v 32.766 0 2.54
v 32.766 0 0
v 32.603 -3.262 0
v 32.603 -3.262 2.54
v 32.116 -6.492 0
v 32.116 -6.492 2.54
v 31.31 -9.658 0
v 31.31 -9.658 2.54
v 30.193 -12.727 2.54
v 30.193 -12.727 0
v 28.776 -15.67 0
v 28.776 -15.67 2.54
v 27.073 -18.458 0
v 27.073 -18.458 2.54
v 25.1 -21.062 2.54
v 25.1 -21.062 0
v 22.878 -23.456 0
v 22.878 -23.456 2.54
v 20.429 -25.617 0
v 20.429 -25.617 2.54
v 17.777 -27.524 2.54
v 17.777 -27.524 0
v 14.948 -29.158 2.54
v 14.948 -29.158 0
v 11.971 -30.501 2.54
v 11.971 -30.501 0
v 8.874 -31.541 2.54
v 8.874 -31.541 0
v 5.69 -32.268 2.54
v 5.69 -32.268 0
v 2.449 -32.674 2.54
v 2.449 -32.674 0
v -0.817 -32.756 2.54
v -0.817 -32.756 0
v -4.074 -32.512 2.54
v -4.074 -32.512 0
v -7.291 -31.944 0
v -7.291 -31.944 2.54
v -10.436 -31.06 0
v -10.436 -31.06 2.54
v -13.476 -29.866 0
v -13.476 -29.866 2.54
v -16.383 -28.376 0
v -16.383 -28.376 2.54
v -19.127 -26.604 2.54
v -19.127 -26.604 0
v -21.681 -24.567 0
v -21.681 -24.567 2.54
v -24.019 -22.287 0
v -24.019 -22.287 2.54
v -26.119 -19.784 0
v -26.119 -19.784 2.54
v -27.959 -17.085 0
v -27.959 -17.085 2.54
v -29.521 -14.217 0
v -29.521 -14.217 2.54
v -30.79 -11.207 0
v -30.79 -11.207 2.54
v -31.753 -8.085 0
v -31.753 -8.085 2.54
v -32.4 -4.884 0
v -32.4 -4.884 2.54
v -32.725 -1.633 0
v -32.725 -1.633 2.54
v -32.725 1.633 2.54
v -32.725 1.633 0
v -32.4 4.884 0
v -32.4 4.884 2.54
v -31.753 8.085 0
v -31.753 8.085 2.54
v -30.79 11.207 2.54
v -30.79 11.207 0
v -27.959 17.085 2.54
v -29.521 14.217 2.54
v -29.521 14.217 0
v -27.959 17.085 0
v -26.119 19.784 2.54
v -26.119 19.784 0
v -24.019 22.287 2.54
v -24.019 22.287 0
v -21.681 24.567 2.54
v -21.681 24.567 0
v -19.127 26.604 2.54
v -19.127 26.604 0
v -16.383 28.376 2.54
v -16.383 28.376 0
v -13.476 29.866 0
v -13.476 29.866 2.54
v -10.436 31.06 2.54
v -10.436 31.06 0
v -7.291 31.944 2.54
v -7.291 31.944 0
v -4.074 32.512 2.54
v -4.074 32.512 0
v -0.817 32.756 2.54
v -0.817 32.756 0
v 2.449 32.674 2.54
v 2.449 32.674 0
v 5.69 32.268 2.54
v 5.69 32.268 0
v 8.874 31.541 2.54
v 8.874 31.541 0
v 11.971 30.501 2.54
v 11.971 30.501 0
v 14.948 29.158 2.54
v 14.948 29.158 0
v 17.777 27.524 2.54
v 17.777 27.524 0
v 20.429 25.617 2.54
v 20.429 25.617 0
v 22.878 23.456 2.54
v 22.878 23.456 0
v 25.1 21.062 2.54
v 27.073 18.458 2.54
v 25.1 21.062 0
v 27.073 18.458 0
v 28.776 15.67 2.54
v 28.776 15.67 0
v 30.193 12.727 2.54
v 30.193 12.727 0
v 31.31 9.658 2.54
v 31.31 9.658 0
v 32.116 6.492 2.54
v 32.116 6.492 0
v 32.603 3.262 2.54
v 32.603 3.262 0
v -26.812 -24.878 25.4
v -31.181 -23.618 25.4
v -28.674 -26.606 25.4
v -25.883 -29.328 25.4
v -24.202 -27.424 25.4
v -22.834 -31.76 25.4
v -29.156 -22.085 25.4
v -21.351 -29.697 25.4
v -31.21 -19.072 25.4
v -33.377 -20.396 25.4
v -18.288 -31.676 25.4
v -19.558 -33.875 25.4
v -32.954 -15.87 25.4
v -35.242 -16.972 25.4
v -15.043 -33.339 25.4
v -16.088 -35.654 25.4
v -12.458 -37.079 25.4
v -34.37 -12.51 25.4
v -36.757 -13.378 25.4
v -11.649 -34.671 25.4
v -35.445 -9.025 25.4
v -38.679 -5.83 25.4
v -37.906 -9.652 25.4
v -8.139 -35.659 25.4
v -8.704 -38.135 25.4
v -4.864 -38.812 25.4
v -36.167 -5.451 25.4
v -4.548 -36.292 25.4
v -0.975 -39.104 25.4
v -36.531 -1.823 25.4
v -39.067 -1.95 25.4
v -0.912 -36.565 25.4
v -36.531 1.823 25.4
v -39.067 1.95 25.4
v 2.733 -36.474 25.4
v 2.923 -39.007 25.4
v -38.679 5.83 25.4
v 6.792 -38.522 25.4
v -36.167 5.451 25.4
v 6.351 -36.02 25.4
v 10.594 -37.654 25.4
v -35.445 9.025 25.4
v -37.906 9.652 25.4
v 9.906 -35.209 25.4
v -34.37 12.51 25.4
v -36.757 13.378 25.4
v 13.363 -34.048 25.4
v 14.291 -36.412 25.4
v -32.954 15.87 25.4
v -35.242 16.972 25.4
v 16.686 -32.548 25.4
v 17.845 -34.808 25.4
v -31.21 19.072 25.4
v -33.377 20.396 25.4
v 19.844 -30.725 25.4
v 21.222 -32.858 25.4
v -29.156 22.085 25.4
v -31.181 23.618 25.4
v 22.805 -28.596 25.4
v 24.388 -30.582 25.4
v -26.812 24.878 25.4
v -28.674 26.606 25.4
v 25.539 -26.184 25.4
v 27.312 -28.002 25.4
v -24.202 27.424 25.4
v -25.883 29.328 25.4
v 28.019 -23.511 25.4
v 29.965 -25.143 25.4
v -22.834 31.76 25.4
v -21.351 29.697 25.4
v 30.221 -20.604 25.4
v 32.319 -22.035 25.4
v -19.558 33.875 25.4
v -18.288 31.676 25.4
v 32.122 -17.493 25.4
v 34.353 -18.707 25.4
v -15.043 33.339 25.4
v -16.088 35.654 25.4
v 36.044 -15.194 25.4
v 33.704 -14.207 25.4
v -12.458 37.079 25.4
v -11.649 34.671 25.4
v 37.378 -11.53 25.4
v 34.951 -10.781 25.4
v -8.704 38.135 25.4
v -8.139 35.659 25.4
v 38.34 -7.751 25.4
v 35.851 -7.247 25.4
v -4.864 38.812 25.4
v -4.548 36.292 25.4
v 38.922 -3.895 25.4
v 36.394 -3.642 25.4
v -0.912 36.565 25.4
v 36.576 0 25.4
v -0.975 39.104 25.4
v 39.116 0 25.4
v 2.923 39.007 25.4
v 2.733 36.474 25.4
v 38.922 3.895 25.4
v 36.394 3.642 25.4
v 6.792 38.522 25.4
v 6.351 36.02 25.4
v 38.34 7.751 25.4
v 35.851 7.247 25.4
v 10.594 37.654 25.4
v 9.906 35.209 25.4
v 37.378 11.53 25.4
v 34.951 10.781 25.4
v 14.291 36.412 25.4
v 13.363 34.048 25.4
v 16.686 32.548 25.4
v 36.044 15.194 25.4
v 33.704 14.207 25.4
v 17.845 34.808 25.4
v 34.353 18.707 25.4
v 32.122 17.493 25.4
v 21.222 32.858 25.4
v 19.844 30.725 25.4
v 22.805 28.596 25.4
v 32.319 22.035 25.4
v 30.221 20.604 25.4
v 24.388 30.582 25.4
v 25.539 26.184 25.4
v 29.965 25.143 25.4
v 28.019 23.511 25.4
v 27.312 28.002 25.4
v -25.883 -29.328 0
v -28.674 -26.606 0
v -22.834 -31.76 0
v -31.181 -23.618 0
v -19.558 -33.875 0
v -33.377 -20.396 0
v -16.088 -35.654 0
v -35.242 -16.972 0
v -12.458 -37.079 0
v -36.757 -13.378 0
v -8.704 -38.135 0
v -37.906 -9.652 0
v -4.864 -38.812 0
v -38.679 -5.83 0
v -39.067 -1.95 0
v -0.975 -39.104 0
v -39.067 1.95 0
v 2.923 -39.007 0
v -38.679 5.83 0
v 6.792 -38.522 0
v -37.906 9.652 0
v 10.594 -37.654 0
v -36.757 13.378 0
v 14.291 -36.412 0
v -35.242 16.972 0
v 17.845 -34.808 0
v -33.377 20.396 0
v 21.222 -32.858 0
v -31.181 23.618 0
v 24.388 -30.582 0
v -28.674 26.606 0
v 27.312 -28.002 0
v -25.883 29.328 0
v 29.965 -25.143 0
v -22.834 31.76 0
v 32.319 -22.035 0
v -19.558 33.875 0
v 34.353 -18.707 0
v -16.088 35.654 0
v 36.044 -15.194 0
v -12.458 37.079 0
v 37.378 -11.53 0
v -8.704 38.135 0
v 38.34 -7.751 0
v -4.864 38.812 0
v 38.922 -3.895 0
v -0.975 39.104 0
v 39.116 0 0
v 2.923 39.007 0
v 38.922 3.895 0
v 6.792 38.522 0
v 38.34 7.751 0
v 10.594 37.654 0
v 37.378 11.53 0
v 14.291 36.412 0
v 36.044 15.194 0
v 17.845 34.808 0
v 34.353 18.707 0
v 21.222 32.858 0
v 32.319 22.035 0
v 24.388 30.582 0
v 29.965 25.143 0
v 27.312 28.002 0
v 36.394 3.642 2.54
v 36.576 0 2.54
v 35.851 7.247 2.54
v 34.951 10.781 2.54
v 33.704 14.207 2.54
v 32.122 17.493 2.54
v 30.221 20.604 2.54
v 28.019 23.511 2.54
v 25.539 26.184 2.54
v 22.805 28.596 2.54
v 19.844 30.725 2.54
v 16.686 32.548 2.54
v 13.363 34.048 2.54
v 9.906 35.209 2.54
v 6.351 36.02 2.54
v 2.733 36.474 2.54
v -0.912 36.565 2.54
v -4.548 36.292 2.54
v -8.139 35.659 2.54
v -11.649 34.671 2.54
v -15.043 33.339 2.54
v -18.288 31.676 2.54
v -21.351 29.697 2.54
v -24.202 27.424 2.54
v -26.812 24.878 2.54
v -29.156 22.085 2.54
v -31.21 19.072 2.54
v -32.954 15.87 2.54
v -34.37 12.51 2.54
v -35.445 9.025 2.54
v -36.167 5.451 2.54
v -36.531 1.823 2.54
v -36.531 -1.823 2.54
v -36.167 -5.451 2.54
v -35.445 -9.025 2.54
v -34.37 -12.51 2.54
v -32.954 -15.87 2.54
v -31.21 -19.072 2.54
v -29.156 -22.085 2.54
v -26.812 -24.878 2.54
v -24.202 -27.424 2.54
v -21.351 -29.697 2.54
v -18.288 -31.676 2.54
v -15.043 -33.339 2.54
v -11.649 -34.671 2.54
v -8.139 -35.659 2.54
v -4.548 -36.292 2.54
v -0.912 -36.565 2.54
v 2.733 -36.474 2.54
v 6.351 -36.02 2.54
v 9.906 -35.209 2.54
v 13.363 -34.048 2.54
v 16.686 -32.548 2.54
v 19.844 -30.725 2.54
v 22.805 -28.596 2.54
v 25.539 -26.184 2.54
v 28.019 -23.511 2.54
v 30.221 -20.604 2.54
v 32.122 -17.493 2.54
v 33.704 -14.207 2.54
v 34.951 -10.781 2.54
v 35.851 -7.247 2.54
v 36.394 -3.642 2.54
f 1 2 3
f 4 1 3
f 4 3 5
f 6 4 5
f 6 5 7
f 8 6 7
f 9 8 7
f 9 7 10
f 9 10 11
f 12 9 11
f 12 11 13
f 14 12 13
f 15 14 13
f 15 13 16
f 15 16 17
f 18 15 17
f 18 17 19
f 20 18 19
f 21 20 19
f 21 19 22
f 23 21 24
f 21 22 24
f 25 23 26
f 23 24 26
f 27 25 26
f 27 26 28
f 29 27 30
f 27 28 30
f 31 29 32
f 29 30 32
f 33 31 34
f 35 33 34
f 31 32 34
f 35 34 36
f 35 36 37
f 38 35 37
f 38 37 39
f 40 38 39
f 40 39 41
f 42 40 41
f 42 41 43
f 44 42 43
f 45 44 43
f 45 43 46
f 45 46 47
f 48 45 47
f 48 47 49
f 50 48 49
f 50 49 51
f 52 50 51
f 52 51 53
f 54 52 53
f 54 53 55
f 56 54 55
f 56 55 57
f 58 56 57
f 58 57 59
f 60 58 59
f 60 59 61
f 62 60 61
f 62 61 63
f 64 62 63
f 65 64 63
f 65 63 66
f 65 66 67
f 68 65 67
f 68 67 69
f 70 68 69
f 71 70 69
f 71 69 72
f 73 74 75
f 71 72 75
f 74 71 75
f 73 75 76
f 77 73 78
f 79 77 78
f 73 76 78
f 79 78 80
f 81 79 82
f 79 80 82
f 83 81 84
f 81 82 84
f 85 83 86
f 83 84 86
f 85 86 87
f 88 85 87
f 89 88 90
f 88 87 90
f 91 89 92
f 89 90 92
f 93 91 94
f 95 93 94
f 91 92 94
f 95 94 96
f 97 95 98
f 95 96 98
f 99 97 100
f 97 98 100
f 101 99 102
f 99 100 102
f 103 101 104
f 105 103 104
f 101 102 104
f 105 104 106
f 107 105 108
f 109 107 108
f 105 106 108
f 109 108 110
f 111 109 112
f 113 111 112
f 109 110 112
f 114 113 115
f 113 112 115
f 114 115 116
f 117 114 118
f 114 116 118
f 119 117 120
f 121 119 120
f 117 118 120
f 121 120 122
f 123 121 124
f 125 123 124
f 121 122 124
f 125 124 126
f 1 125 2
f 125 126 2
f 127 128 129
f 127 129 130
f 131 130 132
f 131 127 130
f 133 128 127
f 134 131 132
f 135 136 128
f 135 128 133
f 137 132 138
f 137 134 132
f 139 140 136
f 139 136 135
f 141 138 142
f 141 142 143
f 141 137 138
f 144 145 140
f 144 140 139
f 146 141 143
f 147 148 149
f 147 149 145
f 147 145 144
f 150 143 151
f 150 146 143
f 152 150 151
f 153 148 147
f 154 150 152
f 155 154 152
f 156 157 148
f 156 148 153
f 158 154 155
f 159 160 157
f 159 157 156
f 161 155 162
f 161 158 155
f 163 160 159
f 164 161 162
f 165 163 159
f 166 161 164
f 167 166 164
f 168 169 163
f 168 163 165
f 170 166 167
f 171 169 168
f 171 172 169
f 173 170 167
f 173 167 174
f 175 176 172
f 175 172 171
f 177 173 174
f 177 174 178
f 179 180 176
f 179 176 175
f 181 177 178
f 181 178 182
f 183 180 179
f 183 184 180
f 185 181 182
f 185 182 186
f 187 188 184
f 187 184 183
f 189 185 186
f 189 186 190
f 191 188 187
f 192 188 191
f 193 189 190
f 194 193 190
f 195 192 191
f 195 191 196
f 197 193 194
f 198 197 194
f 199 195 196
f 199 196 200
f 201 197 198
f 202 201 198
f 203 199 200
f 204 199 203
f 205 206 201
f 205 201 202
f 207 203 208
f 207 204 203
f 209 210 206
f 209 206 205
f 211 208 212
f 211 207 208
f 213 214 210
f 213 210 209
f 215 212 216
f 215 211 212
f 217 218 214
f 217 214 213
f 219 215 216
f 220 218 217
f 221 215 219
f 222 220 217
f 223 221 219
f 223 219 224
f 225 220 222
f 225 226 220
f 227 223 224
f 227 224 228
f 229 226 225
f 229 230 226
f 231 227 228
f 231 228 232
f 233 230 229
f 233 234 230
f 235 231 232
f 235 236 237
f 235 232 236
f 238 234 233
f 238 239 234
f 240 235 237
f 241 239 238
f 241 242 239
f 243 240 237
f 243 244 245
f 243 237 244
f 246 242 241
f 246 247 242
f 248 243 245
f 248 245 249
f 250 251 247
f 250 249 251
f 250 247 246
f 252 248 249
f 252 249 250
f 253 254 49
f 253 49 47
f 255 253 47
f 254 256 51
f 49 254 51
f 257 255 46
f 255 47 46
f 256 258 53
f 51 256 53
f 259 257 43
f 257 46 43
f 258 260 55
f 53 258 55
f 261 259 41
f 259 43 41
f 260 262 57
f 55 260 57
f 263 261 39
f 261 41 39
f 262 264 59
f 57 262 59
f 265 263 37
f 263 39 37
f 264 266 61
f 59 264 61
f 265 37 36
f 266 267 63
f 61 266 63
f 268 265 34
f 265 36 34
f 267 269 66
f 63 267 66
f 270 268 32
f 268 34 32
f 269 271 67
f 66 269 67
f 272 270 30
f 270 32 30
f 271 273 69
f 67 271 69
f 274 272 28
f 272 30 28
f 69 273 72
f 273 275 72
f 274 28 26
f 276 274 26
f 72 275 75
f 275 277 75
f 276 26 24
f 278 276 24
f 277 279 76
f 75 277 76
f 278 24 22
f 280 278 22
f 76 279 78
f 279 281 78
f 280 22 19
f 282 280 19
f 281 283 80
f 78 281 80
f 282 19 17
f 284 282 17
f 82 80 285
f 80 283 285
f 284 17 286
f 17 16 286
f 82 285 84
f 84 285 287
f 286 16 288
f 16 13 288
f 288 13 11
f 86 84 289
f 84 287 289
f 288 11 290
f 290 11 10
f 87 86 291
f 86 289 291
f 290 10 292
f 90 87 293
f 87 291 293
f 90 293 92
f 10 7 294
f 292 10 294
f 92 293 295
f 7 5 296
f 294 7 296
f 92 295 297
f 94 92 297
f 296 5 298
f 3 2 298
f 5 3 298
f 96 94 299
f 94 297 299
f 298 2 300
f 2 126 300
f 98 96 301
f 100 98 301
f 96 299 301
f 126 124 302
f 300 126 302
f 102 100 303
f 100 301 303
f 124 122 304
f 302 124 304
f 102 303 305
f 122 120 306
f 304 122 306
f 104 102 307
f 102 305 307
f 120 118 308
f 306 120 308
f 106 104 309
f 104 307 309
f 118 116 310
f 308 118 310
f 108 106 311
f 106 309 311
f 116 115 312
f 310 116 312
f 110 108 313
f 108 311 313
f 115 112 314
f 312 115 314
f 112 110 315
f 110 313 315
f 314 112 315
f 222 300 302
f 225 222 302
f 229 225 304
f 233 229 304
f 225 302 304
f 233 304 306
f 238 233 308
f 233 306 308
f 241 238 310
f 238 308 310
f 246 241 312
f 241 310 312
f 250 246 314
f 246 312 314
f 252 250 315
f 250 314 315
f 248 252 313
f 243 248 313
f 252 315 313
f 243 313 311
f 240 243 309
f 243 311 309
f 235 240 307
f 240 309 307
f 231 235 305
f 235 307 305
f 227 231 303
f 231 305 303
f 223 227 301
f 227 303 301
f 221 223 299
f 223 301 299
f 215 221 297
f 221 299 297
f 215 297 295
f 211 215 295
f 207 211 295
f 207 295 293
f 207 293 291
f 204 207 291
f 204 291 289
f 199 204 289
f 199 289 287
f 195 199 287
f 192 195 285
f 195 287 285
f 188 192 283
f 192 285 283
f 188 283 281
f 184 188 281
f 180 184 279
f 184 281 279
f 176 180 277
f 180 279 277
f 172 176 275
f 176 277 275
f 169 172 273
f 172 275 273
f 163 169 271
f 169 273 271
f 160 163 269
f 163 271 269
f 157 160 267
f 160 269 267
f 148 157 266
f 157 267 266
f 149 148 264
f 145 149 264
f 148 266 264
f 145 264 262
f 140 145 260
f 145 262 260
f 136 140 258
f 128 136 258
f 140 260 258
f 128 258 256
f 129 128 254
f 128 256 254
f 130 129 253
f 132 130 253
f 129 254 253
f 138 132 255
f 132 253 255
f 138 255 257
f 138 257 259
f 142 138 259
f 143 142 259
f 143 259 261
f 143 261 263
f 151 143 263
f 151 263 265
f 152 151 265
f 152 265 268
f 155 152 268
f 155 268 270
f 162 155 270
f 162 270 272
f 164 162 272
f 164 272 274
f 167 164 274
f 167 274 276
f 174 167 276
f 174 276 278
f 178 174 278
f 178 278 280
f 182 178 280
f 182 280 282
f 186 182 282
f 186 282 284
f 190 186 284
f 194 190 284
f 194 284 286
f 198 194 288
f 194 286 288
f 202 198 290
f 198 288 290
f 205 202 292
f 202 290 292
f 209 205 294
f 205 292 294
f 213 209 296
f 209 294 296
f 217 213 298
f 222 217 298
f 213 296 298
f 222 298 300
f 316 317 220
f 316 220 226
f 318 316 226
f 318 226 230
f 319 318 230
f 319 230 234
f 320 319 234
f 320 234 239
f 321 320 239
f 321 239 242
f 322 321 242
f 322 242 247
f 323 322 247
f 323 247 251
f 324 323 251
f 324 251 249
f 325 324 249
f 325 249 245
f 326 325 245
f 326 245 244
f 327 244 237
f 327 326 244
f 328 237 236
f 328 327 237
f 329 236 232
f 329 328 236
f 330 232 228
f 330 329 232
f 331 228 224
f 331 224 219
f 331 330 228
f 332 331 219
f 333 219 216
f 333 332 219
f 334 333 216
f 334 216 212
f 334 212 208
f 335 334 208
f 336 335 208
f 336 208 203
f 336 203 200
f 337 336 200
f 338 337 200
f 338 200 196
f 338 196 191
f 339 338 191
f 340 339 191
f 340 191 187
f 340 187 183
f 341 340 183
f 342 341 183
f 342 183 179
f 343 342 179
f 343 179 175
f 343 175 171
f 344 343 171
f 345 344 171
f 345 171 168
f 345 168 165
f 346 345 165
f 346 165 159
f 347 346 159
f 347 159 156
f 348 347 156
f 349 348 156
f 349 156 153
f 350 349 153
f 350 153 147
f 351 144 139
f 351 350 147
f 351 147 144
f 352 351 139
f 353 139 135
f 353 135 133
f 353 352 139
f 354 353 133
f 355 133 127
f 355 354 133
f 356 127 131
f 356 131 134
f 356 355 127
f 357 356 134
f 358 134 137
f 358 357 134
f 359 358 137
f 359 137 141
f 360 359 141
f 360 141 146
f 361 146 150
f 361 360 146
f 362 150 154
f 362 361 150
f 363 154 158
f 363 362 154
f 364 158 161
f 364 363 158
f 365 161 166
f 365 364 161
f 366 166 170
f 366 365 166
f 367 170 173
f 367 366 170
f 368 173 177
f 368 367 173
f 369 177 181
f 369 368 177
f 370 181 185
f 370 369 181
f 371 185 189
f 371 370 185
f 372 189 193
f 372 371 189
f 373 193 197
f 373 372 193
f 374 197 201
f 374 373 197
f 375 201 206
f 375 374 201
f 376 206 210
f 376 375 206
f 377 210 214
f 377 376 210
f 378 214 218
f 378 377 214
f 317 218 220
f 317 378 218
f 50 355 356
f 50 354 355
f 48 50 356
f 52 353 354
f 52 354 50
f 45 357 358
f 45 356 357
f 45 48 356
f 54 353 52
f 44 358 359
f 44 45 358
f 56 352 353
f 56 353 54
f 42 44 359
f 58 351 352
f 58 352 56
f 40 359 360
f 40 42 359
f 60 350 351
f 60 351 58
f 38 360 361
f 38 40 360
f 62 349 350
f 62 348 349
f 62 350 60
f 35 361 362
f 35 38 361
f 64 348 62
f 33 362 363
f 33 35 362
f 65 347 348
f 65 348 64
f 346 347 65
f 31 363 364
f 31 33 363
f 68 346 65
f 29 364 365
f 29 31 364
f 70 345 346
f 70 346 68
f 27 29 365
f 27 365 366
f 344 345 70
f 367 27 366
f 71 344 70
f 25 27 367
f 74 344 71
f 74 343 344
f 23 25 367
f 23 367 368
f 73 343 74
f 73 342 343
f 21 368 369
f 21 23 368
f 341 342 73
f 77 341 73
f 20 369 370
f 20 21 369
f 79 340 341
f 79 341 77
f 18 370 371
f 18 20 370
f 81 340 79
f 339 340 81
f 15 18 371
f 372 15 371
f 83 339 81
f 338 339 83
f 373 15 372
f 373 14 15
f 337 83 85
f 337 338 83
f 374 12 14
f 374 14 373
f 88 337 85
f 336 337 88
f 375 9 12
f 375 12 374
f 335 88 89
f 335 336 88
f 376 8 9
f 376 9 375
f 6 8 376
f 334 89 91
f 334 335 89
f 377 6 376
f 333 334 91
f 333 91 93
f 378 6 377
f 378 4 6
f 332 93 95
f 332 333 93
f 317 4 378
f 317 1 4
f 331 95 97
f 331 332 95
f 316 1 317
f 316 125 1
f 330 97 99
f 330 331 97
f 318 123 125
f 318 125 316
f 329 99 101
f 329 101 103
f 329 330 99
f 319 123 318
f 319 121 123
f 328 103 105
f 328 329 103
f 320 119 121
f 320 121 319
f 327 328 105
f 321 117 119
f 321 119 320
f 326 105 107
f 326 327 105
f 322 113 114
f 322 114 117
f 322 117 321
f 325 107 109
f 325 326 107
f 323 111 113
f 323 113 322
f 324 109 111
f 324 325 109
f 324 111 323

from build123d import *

# Parameters (mm, degrees)
F0_R     = 39.116
F1_DEPTH = 25.4
F2_T     = -2.54
F3_R     = 32.766
F4_DEPTH = 25.4


with BuildPart() as f1:
    # F0 (on Top) → F1 (new body)
    with BuildSketch(Plane.XY):
        Circle(F0_R)
    extrude(amount=F1_DEPTH)

    # F2
    f2_openings = [f1.faces().sort_by_distance(p)[0] for p in [
        (0, 0, 25.4),
    ]]
    offset(amount=F2_T, openings=f2_openings)

    # F3 (on face) → F4 (cut)
    with BuildSketch(Plane(origin=(0, 0, 0), x_dir=(1, 0, 0), z_dir=(0, 0, -1))):
        Circle(F3_R)
    extrude(amount=-F4_DEPTH, mode=Mode.SUBTRACT)


solid = f1.part
